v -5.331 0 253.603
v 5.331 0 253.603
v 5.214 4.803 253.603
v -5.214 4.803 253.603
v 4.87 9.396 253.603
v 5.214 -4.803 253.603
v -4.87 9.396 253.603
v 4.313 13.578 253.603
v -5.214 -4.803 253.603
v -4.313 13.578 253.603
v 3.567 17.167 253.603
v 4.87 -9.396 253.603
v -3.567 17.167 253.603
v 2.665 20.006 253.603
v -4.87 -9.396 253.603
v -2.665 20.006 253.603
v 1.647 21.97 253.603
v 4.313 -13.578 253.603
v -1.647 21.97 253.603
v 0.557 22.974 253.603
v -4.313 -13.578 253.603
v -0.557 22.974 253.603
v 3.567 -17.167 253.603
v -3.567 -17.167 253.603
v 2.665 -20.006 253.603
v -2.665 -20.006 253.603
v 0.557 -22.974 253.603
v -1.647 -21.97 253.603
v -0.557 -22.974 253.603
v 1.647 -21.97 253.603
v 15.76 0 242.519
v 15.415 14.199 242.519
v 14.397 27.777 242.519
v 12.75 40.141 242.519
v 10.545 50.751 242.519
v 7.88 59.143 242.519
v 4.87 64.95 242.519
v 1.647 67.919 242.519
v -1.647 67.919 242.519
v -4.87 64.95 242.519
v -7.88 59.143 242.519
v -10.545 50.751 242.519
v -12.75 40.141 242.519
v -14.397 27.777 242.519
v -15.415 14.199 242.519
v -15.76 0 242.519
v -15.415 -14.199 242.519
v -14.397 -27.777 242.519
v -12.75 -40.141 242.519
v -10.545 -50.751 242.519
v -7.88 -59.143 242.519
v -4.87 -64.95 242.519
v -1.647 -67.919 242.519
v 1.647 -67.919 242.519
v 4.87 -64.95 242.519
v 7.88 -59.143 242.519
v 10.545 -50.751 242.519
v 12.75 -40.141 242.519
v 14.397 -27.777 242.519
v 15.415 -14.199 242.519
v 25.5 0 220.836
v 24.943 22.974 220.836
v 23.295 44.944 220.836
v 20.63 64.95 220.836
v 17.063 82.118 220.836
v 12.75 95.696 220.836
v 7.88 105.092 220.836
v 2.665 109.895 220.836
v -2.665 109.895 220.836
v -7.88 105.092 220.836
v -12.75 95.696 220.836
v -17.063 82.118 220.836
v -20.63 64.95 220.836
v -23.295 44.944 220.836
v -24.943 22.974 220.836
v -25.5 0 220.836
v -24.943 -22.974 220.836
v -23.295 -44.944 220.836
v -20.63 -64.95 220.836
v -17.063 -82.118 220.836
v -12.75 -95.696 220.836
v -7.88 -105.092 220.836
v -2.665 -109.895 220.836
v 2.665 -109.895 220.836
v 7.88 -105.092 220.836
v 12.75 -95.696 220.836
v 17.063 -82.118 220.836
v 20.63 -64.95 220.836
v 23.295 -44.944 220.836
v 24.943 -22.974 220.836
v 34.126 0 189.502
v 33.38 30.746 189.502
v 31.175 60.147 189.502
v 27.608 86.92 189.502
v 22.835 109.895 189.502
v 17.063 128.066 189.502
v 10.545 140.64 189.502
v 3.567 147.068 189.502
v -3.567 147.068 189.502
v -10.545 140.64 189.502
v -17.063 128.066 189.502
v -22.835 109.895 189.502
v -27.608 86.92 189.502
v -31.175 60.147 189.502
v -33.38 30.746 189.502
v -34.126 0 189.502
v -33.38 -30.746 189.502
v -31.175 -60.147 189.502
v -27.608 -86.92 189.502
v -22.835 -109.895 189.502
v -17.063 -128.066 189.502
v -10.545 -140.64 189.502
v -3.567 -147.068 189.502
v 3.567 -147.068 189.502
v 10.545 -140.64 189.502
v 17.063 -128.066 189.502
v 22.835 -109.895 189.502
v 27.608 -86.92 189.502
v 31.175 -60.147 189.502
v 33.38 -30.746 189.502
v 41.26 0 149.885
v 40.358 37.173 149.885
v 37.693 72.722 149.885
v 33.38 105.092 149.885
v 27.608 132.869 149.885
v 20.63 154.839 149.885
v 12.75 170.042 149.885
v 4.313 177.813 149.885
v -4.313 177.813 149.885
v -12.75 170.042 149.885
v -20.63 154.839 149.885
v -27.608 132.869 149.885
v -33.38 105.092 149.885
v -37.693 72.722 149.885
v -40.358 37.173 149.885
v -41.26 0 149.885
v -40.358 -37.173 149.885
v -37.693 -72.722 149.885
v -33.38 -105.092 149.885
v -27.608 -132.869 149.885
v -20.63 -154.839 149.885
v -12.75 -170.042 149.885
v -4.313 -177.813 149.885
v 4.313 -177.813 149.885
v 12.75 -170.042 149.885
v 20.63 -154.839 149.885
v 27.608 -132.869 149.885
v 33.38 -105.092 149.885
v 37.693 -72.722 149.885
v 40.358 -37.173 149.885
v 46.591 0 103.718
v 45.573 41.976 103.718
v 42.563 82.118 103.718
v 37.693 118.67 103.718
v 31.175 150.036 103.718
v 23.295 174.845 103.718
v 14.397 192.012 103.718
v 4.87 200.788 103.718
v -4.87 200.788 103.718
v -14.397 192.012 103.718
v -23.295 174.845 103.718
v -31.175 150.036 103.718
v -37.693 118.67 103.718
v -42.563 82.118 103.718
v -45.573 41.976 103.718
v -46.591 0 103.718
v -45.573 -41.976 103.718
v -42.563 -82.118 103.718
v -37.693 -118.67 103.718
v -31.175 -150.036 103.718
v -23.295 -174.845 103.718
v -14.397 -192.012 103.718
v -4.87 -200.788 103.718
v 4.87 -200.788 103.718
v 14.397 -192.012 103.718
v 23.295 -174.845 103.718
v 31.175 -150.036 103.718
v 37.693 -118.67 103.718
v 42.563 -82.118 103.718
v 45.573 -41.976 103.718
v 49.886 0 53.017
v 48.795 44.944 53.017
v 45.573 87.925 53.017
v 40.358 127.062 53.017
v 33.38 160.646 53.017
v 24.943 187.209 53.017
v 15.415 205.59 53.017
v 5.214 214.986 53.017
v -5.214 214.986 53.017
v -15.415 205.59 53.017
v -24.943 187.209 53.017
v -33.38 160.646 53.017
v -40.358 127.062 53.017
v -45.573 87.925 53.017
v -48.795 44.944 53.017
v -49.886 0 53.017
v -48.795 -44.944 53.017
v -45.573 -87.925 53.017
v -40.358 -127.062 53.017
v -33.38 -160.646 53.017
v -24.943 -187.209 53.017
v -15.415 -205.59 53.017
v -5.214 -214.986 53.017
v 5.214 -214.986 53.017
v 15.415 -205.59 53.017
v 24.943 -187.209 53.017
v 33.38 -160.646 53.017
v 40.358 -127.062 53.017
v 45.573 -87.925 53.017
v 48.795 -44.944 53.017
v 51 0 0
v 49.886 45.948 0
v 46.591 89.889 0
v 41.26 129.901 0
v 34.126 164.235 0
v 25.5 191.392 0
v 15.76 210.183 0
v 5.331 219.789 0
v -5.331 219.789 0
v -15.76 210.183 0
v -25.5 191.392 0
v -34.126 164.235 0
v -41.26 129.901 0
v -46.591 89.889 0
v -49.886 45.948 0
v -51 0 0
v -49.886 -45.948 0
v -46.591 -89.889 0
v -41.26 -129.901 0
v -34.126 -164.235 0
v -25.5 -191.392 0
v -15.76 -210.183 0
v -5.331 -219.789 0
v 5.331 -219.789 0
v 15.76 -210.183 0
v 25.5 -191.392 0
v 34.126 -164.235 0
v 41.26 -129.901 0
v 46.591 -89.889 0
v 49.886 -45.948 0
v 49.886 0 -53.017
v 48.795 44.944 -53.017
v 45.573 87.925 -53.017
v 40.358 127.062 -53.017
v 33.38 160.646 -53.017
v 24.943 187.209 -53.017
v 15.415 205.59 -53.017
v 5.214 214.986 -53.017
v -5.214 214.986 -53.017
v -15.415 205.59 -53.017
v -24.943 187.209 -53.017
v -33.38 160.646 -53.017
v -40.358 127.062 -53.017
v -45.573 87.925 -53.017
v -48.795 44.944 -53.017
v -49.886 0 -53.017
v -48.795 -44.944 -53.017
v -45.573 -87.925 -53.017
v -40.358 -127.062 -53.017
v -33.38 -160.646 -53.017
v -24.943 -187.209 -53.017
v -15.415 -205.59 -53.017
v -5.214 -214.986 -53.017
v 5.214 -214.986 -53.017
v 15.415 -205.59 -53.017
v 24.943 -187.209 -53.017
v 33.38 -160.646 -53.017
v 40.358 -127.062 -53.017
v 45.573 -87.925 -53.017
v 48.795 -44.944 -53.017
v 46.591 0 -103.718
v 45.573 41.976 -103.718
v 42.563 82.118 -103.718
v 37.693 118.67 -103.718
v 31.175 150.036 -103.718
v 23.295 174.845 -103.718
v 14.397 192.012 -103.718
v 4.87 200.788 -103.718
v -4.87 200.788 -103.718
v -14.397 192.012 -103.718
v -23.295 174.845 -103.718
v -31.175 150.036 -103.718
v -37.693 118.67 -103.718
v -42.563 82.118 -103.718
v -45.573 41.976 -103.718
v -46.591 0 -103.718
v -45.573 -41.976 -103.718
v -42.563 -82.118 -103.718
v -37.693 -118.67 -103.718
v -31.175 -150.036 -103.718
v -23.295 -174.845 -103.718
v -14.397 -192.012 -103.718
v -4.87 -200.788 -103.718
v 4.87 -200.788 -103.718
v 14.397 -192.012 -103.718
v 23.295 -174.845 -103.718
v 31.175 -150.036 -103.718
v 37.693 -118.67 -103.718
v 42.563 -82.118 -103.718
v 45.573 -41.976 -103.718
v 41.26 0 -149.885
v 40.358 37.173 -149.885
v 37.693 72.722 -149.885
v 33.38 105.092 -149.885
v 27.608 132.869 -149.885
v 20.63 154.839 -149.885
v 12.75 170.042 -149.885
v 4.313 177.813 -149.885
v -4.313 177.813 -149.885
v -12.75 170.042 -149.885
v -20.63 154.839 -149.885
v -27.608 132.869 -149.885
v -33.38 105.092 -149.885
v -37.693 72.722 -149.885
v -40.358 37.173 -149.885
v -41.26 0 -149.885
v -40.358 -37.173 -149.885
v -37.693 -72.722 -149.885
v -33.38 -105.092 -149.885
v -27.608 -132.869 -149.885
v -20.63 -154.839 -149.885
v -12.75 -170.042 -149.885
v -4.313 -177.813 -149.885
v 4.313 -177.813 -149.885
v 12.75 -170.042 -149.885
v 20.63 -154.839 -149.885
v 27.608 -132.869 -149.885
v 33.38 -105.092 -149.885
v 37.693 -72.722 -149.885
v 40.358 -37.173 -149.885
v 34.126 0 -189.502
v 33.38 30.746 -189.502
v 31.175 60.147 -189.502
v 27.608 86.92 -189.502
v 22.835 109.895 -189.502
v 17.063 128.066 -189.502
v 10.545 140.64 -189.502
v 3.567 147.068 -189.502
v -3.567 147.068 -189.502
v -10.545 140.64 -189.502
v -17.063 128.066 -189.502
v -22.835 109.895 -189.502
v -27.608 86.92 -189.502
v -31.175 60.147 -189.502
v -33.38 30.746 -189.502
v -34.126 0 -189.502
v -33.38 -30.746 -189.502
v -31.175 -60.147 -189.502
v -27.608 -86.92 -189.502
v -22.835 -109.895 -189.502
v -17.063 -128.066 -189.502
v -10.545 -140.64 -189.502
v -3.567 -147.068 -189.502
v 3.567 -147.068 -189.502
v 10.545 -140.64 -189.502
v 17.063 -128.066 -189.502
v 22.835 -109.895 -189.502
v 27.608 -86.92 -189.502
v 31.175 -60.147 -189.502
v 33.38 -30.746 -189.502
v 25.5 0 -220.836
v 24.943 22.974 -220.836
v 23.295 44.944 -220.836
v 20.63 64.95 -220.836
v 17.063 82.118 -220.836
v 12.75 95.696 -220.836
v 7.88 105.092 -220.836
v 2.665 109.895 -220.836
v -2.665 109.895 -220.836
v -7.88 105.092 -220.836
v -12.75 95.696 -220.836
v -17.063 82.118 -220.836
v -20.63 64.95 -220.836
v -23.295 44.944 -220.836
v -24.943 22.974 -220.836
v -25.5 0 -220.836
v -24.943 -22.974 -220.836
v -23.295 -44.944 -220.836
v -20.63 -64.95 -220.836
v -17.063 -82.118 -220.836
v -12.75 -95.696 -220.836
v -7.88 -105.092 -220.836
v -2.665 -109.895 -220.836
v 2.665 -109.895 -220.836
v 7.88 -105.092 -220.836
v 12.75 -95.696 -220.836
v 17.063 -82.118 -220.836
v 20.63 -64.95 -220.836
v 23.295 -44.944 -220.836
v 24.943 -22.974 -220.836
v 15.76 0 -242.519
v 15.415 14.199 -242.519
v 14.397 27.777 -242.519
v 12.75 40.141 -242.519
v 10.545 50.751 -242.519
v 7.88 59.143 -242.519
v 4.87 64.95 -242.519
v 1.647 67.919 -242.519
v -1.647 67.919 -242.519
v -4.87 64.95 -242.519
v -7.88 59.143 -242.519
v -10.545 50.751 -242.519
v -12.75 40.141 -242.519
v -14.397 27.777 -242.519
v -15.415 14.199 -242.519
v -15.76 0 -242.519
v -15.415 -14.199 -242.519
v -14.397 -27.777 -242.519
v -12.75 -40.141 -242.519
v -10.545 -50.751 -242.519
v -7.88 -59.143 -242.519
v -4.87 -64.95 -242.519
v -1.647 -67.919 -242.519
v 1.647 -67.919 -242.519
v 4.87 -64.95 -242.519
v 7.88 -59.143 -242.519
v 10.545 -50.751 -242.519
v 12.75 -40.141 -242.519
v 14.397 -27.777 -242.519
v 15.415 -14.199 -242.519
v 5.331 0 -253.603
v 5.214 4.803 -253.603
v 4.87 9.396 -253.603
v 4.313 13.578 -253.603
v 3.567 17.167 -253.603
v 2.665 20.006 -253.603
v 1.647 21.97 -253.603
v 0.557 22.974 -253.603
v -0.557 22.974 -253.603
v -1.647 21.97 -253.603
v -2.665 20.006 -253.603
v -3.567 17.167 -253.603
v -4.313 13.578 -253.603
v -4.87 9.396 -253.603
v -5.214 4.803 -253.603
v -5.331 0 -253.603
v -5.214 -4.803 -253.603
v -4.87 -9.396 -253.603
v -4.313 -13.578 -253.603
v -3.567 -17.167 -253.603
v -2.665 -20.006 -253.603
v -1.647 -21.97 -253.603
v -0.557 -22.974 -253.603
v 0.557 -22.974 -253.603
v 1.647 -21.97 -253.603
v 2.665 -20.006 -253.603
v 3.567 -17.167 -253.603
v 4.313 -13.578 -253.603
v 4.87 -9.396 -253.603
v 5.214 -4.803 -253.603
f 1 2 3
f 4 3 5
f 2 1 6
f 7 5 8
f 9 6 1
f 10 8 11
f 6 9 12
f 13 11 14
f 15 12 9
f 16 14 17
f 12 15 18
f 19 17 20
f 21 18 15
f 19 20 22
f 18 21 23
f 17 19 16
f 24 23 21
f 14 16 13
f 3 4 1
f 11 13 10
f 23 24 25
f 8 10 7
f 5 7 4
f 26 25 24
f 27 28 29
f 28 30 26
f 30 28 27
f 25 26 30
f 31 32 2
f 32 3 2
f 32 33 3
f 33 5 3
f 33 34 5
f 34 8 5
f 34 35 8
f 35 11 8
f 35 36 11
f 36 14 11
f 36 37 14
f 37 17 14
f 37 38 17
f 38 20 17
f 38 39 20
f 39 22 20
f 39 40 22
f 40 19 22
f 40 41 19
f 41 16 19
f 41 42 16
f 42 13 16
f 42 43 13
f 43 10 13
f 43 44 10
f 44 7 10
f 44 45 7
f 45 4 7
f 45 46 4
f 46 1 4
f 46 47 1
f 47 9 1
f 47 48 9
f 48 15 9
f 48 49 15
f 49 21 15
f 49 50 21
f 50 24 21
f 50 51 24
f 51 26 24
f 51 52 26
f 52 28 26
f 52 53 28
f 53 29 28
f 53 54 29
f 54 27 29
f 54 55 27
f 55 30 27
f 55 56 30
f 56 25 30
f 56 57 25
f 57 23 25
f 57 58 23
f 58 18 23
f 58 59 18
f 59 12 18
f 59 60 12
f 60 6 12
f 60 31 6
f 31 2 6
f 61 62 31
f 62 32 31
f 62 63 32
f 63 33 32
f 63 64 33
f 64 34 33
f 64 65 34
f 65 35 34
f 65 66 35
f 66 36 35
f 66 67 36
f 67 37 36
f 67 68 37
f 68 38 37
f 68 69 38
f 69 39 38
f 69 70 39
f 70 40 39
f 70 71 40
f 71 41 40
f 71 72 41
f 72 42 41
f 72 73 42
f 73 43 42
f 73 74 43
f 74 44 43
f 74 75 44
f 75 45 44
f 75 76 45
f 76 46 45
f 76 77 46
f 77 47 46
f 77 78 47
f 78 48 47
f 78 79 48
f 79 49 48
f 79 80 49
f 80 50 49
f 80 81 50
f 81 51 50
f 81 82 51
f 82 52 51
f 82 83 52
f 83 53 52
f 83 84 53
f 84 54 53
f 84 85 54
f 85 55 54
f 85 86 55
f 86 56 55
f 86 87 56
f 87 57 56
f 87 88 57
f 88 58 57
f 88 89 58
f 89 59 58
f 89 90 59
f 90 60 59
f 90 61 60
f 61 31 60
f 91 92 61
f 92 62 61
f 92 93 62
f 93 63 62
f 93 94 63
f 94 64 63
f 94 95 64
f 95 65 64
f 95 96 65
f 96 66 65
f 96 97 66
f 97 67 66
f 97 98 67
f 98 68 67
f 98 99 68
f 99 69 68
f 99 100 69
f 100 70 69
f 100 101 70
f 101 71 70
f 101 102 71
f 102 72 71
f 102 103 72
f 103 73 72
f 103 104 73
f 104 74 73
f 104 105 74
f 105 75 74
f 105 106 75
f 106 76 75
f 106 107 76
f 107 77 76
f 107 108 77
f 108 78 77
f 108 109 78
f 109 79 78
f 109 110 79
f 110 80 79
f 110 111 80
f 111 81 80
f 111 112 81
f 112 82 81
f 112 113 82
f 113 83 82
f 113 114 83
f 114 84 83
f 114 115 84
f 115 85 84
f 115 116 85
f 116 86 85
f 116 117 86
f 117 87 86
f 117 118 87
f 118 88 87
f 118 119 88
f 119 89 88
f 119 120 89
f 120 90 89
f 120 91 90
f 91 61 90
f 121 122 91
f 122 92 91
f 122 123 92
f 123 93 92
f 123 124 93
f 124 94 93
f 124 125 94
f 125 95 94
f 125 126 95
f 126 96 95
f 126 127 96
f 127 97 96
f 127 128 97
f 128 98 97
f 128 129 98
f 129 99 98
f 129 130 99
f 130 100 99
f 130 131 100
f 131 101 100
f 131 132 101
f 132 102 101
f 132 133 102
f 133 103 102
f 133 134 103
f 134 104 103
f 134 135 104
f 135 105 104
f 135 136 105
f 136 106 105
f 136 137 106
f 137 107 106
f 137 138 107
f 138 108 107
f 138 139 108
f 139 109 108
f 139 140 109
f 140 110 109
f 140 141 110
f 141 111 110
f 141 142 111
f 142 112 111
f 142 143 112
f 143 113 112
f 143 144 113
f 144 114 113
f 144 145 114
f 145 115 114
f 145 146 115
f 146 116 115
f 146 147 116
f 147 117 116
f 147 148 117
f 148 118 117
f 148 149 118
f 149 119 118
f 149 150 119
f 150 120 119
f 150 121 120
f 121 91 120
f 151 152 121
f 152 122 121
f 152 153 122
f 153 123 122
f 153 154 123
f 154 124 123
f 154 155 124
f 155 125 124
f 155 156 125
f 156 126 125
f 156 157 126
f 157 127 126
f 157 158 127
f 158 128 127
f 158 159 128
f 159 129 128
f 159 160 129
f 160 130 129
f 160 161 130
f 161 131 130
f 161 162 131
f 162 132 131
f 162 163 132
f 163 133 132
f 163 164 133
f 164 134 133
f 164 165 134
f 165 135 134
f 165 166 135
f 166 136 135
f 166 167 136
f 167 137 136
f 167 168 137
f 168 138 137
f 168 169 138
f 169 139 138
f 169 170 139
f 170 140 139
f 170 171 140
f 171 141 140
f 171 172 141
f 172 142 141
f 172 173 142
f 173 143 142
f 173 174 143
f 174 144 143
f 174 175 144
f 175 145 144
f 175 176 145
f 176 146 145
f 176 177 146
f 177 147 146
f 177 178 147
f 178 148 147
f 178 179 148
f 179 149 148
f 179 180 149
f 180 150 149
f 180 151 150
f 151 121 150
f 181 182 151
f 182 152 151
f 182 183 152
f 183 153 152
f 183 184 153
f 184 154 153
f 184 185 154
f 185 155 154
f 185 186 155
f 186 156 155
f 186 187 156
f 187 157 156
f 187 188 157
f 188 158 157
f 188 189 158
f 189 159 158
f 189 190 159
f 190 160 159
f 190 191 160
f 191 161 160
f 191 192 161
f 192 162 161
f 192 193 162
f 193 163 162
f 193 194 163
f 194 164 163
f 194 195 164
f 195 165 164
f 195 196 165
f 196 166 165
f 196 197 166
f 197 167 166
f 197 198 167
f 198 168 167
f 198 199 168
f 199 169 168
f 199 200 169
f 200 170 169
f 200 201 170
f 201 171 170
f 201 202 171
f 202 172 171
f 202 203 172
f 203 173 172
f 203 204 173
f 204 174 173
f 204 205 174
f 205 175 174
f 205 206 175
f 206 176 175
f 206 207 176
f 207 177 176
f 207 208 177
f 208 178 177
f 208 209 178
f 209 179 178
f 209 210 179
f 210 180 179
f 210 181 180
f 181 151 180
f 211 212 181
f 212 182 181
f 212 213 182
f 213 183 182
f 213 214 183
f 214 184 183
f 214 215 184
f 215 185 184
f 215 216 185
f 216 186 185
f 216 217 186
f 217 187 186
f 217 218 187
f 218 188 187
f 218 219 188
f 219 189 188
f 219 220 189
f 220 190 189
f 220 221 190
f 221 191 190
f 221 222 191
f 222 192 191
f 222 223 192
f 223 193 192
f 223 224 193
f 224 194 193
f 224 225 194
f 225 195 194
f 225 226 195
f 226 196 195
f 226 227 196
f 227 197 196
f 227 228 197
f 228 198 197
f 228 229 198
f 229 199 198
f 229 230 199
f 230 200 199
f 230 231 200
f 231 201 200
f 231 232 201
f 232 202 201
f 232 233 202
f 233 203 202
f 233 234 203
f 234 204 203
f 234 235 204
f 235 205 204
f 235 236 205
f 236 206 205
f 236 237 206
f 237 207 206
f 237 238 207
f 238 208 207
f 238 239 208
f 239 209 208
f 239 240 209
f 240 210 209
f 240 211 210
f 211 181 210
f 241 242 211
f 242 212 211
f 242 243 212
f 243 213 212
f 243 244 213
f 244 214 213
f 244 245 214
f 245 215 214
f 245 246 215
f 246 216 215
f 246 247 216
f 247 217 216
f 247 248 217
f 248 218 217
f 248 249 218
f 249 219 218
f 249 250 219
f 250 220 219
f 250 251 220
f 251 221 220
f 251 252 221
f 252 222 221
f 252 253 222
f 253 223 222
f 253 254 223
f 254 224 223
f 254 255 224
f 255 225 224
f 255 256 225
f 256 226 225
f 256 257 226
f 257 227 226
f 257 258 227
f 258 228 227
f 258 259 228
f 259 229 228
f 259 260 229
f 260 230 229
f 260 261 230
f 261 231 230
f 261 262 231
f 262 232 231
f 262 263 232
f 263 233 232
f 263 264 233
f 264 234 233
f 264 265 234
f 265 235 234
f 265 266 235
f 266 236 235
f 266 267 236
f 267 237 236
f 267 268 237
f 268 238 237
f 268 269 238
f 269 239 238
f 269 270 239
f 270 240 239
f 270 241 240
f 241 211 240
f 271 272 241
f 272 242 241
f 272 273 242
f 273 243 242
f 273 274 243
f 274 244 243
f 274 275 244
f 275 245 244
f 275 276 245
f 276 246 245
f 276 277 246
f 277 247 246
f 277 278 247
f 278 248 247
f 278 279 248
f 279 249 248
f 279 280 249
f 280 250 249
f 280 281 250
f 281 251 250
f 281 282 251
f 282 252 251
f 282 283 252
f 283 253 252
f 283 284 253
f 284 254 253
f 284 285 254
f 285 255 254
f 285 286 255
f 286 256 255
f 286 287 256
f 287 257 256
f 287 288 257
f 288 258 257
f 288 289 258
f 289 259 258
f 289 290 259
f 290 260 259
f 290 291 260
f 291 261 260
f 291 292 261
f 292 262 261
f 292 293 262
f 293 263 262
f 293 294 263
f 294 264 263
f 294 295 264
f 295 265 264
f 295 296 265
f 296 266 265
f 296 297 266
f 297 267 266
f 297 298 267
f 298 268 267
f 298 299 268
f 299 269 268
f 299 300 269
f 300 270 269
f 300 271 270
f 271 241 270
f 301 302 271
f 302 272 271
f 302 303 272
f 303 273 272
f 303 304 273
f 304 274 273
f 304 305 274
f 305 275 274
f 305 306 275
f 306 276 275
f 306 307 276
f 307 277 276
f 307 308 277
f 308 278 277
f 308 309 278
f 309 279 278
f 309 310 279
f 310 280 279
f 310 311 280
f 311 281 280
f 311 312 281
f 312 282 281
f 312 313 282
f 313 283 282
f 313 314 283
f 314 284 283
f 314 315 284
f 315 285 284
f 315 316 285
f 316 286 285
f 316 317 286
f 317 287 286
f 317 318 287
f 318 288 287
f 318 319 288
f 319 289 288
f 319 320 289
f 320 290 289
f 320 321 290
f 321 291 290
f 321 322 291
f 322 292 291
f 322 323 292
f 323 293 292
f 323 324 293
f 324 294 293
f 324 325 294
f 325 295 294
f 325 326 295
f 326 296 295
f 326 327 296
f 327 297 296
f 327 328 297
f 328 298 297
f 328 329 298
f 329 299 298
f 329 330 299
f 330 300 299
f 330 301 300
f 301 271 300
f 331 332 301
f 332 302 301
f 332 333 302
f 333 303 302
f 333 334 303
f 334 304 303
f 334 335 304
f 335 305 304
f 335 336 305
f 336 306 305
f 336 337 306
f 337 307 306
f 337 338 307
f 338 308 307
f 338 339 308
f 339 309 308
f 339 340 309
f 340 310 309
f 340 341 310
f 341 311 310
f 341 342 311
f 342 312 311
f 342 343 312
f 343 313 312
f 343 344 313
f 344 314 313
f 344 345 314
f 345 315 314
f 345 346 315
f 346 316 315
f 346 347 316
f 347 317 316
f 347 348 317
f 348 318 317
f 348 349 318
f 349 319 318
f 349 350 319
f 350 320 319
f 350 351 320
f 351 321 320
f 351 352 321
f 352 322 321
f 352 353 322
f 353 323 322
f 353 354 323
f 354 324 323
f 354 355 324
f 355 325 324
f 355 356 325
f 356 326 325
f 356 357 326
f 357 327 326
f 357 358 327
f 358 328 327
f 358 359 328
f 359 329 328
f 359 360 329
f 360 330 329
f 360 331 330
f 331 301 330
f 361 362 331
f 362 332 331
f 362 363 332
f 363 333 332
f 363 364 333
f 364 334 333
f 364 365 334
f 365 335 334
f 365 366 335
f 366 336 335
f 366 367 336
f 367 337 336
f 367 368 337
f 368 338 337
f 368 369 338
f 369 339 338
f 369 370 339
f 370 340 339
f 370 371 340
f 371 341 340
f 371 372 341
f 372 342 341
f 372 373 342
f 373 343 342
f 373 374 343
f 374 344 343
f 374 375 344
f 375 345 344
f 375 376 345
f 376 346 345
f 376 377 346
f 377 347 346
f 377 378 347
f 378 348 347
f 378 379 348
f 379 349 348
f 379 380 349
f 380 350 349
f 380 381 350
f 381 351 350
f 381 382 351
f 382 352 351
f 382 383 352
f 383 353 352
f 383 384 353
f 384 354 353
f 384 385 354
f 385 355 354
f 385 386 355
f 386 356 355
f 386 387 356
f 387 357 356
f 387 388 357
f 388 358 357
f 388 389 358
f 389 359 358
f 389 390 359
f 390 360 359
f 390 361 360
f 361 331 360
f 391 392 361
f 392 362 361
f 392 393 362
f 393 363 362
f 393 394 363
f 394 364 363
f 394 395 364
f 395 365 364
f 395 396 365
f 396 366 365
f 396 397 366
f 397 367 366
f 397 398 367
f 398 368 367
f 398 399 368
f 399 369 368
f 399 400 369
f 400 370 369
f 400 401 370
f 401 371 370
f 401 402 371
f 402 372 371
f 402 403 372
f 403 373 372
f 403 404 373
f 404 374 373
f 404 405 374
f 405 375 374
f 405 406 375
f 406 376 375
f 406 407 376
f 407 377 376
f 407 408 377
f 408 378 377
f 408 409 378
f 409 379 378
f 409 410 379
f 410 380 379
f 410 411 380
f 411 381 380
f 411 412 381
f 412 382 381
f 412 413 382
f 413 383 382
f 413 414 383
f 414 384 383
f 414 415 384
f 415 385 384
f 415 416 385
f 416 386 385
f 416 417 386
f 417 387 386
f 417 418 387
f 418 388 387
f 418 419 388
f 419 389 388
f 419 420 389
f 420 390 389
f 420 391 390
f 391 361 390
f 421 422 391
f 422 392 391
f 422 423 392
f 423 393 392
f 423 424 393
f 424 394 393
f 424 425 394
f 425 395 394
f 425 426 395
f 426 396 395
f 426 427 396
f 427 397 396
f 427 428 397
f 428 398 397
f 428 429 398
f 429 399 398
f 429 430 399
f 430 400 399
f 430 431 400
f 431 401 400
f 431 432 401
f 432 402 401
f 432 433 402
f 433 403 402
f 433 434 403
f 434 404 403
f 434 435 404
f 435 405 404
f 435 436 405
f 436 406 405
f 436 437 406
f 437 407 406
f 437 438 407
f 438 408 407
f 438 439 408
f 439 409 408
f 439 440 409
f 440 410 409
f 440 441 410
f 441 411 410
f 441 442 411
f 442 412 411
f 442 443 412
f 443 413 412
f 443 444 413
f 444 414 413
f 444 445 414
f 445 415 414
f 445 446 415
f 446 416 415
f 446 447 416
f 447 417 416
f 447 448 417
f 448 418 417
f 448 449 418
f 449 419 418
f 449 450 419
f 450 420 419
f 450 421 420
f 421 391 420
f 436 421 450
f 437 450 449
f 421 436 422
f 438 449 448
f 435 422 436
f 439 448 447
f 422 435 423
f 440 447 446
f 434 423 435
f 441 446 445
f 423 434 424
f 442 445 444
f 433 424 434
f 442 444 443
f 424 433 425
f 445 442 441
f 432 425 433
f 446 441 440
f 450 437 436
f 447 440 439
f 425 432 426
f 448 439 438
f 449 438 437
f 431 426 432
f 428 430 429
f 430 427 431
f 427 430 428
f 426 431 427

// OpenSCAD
// Generated by SolidPython 1.0.1 on 2020-07-29 00:46:45


scale(v = [3, 13, 15]) {
	sphere(r = 17);
}
/***********************************************
*********      SolidPython code:      **********
************************************************
 
# import packages: SolidPython
from solid import *
from solid.utils import *
from itertools import chain, combinations, permutations


class Resize:

    def __init__(self, scad_file):
        self.scad_file = scad_file
        #self.scad_file = import_scad(scad_file)
        # cone/cylinder param:
        self.r1 = 0
        self.r2 = 0
        self.h = 0
        # rectangular prism param:
        self.w = 0
        self.l = 0
        # ellipse param:
        self.r = 0

    # import OpenScad code (file name corresponds to shape)


    # classify shape + parameters
    def assign(self, param1, param2, param3):
        if self.scad_file == 'cone.scad':
            self.r1 = param1
            self.r2 = param2
            self.h = param3
        elif self.scad_file == 'cylinder.scad':
            self.r1 = param1
            self.r2 = param2
            self.h = param3
        elif self.scad_file == 'rectangularPrism.scad':
            self.h = param1
            self.l = param2
            self.w = param3
        else:
            self.r = param1
            self.h = param2

    # resize parameters
    def iterate(self):
        x = range(3, 20, 2)
        i = 1
        if self.scad_file == 'cone.scad':
            tempList = list(permutations(x, 2))
            for temp in tempList:
                param1 = temp[0]
                param2 = temp[1]
                filepath = 'produced_scad_files/' + 'cone' + str(param1) + '_' + str(param2) + '_' + '.scad'
                scad_render_to_file(cylinder(h=param1, r1=param2, r2=0), filepath)

        elif self.scad_file == 'cylinder.scad':
            tempList = list(permutations(x, 3))
            for temp in tempList:
                param1 = temp[0]
                param2 = temp[1]
                filepath = 'produced_scad_files/' + 'cylinder' + str(param1) + '_' + str(param2) + '_' + '.scad'
                scad_render_to_file(cylinder(h=param1, r1=param2, r2=param2), filepath)

        elif self.scad_file == 'rectangularPrism.scad':
            tempList = list(permutations(x, 3))
            for temp in tempList:
                param1 = temp[0]
                param2 = temp[1]
                param3 = temp[2]
                filepath = 'produced_scad_files/' + 'rectangularPrism' + str(param1) + '_' + str(param2) + '_' + str(
                    param3) + '.scad'
                scad_render_to_file(cube(size=(param1, param2, param3)), filepath)

        elif self.scad_file == 'ellipse.scad':
            tempList = list(permutations(x, 4))
            for temp in tempList:
                param1 = temp[0]
                param2 = temp[1]
                param3 = temp[2]
                param4 = temp[3]
                filepath = 'produced_scad_files/' + 'ellipse' + str(param1) + '_' + str(param2) + '_' + str(param3) + '_' + str(param4) + '.scad'
                scad_render_to_file(scale([param1, param2, param3])(sphere(r=param4)), filepath)

    def render_to_scadfile(self):
        scad_render_to_file(scad, 'example.scad') 
 
************************************************/
